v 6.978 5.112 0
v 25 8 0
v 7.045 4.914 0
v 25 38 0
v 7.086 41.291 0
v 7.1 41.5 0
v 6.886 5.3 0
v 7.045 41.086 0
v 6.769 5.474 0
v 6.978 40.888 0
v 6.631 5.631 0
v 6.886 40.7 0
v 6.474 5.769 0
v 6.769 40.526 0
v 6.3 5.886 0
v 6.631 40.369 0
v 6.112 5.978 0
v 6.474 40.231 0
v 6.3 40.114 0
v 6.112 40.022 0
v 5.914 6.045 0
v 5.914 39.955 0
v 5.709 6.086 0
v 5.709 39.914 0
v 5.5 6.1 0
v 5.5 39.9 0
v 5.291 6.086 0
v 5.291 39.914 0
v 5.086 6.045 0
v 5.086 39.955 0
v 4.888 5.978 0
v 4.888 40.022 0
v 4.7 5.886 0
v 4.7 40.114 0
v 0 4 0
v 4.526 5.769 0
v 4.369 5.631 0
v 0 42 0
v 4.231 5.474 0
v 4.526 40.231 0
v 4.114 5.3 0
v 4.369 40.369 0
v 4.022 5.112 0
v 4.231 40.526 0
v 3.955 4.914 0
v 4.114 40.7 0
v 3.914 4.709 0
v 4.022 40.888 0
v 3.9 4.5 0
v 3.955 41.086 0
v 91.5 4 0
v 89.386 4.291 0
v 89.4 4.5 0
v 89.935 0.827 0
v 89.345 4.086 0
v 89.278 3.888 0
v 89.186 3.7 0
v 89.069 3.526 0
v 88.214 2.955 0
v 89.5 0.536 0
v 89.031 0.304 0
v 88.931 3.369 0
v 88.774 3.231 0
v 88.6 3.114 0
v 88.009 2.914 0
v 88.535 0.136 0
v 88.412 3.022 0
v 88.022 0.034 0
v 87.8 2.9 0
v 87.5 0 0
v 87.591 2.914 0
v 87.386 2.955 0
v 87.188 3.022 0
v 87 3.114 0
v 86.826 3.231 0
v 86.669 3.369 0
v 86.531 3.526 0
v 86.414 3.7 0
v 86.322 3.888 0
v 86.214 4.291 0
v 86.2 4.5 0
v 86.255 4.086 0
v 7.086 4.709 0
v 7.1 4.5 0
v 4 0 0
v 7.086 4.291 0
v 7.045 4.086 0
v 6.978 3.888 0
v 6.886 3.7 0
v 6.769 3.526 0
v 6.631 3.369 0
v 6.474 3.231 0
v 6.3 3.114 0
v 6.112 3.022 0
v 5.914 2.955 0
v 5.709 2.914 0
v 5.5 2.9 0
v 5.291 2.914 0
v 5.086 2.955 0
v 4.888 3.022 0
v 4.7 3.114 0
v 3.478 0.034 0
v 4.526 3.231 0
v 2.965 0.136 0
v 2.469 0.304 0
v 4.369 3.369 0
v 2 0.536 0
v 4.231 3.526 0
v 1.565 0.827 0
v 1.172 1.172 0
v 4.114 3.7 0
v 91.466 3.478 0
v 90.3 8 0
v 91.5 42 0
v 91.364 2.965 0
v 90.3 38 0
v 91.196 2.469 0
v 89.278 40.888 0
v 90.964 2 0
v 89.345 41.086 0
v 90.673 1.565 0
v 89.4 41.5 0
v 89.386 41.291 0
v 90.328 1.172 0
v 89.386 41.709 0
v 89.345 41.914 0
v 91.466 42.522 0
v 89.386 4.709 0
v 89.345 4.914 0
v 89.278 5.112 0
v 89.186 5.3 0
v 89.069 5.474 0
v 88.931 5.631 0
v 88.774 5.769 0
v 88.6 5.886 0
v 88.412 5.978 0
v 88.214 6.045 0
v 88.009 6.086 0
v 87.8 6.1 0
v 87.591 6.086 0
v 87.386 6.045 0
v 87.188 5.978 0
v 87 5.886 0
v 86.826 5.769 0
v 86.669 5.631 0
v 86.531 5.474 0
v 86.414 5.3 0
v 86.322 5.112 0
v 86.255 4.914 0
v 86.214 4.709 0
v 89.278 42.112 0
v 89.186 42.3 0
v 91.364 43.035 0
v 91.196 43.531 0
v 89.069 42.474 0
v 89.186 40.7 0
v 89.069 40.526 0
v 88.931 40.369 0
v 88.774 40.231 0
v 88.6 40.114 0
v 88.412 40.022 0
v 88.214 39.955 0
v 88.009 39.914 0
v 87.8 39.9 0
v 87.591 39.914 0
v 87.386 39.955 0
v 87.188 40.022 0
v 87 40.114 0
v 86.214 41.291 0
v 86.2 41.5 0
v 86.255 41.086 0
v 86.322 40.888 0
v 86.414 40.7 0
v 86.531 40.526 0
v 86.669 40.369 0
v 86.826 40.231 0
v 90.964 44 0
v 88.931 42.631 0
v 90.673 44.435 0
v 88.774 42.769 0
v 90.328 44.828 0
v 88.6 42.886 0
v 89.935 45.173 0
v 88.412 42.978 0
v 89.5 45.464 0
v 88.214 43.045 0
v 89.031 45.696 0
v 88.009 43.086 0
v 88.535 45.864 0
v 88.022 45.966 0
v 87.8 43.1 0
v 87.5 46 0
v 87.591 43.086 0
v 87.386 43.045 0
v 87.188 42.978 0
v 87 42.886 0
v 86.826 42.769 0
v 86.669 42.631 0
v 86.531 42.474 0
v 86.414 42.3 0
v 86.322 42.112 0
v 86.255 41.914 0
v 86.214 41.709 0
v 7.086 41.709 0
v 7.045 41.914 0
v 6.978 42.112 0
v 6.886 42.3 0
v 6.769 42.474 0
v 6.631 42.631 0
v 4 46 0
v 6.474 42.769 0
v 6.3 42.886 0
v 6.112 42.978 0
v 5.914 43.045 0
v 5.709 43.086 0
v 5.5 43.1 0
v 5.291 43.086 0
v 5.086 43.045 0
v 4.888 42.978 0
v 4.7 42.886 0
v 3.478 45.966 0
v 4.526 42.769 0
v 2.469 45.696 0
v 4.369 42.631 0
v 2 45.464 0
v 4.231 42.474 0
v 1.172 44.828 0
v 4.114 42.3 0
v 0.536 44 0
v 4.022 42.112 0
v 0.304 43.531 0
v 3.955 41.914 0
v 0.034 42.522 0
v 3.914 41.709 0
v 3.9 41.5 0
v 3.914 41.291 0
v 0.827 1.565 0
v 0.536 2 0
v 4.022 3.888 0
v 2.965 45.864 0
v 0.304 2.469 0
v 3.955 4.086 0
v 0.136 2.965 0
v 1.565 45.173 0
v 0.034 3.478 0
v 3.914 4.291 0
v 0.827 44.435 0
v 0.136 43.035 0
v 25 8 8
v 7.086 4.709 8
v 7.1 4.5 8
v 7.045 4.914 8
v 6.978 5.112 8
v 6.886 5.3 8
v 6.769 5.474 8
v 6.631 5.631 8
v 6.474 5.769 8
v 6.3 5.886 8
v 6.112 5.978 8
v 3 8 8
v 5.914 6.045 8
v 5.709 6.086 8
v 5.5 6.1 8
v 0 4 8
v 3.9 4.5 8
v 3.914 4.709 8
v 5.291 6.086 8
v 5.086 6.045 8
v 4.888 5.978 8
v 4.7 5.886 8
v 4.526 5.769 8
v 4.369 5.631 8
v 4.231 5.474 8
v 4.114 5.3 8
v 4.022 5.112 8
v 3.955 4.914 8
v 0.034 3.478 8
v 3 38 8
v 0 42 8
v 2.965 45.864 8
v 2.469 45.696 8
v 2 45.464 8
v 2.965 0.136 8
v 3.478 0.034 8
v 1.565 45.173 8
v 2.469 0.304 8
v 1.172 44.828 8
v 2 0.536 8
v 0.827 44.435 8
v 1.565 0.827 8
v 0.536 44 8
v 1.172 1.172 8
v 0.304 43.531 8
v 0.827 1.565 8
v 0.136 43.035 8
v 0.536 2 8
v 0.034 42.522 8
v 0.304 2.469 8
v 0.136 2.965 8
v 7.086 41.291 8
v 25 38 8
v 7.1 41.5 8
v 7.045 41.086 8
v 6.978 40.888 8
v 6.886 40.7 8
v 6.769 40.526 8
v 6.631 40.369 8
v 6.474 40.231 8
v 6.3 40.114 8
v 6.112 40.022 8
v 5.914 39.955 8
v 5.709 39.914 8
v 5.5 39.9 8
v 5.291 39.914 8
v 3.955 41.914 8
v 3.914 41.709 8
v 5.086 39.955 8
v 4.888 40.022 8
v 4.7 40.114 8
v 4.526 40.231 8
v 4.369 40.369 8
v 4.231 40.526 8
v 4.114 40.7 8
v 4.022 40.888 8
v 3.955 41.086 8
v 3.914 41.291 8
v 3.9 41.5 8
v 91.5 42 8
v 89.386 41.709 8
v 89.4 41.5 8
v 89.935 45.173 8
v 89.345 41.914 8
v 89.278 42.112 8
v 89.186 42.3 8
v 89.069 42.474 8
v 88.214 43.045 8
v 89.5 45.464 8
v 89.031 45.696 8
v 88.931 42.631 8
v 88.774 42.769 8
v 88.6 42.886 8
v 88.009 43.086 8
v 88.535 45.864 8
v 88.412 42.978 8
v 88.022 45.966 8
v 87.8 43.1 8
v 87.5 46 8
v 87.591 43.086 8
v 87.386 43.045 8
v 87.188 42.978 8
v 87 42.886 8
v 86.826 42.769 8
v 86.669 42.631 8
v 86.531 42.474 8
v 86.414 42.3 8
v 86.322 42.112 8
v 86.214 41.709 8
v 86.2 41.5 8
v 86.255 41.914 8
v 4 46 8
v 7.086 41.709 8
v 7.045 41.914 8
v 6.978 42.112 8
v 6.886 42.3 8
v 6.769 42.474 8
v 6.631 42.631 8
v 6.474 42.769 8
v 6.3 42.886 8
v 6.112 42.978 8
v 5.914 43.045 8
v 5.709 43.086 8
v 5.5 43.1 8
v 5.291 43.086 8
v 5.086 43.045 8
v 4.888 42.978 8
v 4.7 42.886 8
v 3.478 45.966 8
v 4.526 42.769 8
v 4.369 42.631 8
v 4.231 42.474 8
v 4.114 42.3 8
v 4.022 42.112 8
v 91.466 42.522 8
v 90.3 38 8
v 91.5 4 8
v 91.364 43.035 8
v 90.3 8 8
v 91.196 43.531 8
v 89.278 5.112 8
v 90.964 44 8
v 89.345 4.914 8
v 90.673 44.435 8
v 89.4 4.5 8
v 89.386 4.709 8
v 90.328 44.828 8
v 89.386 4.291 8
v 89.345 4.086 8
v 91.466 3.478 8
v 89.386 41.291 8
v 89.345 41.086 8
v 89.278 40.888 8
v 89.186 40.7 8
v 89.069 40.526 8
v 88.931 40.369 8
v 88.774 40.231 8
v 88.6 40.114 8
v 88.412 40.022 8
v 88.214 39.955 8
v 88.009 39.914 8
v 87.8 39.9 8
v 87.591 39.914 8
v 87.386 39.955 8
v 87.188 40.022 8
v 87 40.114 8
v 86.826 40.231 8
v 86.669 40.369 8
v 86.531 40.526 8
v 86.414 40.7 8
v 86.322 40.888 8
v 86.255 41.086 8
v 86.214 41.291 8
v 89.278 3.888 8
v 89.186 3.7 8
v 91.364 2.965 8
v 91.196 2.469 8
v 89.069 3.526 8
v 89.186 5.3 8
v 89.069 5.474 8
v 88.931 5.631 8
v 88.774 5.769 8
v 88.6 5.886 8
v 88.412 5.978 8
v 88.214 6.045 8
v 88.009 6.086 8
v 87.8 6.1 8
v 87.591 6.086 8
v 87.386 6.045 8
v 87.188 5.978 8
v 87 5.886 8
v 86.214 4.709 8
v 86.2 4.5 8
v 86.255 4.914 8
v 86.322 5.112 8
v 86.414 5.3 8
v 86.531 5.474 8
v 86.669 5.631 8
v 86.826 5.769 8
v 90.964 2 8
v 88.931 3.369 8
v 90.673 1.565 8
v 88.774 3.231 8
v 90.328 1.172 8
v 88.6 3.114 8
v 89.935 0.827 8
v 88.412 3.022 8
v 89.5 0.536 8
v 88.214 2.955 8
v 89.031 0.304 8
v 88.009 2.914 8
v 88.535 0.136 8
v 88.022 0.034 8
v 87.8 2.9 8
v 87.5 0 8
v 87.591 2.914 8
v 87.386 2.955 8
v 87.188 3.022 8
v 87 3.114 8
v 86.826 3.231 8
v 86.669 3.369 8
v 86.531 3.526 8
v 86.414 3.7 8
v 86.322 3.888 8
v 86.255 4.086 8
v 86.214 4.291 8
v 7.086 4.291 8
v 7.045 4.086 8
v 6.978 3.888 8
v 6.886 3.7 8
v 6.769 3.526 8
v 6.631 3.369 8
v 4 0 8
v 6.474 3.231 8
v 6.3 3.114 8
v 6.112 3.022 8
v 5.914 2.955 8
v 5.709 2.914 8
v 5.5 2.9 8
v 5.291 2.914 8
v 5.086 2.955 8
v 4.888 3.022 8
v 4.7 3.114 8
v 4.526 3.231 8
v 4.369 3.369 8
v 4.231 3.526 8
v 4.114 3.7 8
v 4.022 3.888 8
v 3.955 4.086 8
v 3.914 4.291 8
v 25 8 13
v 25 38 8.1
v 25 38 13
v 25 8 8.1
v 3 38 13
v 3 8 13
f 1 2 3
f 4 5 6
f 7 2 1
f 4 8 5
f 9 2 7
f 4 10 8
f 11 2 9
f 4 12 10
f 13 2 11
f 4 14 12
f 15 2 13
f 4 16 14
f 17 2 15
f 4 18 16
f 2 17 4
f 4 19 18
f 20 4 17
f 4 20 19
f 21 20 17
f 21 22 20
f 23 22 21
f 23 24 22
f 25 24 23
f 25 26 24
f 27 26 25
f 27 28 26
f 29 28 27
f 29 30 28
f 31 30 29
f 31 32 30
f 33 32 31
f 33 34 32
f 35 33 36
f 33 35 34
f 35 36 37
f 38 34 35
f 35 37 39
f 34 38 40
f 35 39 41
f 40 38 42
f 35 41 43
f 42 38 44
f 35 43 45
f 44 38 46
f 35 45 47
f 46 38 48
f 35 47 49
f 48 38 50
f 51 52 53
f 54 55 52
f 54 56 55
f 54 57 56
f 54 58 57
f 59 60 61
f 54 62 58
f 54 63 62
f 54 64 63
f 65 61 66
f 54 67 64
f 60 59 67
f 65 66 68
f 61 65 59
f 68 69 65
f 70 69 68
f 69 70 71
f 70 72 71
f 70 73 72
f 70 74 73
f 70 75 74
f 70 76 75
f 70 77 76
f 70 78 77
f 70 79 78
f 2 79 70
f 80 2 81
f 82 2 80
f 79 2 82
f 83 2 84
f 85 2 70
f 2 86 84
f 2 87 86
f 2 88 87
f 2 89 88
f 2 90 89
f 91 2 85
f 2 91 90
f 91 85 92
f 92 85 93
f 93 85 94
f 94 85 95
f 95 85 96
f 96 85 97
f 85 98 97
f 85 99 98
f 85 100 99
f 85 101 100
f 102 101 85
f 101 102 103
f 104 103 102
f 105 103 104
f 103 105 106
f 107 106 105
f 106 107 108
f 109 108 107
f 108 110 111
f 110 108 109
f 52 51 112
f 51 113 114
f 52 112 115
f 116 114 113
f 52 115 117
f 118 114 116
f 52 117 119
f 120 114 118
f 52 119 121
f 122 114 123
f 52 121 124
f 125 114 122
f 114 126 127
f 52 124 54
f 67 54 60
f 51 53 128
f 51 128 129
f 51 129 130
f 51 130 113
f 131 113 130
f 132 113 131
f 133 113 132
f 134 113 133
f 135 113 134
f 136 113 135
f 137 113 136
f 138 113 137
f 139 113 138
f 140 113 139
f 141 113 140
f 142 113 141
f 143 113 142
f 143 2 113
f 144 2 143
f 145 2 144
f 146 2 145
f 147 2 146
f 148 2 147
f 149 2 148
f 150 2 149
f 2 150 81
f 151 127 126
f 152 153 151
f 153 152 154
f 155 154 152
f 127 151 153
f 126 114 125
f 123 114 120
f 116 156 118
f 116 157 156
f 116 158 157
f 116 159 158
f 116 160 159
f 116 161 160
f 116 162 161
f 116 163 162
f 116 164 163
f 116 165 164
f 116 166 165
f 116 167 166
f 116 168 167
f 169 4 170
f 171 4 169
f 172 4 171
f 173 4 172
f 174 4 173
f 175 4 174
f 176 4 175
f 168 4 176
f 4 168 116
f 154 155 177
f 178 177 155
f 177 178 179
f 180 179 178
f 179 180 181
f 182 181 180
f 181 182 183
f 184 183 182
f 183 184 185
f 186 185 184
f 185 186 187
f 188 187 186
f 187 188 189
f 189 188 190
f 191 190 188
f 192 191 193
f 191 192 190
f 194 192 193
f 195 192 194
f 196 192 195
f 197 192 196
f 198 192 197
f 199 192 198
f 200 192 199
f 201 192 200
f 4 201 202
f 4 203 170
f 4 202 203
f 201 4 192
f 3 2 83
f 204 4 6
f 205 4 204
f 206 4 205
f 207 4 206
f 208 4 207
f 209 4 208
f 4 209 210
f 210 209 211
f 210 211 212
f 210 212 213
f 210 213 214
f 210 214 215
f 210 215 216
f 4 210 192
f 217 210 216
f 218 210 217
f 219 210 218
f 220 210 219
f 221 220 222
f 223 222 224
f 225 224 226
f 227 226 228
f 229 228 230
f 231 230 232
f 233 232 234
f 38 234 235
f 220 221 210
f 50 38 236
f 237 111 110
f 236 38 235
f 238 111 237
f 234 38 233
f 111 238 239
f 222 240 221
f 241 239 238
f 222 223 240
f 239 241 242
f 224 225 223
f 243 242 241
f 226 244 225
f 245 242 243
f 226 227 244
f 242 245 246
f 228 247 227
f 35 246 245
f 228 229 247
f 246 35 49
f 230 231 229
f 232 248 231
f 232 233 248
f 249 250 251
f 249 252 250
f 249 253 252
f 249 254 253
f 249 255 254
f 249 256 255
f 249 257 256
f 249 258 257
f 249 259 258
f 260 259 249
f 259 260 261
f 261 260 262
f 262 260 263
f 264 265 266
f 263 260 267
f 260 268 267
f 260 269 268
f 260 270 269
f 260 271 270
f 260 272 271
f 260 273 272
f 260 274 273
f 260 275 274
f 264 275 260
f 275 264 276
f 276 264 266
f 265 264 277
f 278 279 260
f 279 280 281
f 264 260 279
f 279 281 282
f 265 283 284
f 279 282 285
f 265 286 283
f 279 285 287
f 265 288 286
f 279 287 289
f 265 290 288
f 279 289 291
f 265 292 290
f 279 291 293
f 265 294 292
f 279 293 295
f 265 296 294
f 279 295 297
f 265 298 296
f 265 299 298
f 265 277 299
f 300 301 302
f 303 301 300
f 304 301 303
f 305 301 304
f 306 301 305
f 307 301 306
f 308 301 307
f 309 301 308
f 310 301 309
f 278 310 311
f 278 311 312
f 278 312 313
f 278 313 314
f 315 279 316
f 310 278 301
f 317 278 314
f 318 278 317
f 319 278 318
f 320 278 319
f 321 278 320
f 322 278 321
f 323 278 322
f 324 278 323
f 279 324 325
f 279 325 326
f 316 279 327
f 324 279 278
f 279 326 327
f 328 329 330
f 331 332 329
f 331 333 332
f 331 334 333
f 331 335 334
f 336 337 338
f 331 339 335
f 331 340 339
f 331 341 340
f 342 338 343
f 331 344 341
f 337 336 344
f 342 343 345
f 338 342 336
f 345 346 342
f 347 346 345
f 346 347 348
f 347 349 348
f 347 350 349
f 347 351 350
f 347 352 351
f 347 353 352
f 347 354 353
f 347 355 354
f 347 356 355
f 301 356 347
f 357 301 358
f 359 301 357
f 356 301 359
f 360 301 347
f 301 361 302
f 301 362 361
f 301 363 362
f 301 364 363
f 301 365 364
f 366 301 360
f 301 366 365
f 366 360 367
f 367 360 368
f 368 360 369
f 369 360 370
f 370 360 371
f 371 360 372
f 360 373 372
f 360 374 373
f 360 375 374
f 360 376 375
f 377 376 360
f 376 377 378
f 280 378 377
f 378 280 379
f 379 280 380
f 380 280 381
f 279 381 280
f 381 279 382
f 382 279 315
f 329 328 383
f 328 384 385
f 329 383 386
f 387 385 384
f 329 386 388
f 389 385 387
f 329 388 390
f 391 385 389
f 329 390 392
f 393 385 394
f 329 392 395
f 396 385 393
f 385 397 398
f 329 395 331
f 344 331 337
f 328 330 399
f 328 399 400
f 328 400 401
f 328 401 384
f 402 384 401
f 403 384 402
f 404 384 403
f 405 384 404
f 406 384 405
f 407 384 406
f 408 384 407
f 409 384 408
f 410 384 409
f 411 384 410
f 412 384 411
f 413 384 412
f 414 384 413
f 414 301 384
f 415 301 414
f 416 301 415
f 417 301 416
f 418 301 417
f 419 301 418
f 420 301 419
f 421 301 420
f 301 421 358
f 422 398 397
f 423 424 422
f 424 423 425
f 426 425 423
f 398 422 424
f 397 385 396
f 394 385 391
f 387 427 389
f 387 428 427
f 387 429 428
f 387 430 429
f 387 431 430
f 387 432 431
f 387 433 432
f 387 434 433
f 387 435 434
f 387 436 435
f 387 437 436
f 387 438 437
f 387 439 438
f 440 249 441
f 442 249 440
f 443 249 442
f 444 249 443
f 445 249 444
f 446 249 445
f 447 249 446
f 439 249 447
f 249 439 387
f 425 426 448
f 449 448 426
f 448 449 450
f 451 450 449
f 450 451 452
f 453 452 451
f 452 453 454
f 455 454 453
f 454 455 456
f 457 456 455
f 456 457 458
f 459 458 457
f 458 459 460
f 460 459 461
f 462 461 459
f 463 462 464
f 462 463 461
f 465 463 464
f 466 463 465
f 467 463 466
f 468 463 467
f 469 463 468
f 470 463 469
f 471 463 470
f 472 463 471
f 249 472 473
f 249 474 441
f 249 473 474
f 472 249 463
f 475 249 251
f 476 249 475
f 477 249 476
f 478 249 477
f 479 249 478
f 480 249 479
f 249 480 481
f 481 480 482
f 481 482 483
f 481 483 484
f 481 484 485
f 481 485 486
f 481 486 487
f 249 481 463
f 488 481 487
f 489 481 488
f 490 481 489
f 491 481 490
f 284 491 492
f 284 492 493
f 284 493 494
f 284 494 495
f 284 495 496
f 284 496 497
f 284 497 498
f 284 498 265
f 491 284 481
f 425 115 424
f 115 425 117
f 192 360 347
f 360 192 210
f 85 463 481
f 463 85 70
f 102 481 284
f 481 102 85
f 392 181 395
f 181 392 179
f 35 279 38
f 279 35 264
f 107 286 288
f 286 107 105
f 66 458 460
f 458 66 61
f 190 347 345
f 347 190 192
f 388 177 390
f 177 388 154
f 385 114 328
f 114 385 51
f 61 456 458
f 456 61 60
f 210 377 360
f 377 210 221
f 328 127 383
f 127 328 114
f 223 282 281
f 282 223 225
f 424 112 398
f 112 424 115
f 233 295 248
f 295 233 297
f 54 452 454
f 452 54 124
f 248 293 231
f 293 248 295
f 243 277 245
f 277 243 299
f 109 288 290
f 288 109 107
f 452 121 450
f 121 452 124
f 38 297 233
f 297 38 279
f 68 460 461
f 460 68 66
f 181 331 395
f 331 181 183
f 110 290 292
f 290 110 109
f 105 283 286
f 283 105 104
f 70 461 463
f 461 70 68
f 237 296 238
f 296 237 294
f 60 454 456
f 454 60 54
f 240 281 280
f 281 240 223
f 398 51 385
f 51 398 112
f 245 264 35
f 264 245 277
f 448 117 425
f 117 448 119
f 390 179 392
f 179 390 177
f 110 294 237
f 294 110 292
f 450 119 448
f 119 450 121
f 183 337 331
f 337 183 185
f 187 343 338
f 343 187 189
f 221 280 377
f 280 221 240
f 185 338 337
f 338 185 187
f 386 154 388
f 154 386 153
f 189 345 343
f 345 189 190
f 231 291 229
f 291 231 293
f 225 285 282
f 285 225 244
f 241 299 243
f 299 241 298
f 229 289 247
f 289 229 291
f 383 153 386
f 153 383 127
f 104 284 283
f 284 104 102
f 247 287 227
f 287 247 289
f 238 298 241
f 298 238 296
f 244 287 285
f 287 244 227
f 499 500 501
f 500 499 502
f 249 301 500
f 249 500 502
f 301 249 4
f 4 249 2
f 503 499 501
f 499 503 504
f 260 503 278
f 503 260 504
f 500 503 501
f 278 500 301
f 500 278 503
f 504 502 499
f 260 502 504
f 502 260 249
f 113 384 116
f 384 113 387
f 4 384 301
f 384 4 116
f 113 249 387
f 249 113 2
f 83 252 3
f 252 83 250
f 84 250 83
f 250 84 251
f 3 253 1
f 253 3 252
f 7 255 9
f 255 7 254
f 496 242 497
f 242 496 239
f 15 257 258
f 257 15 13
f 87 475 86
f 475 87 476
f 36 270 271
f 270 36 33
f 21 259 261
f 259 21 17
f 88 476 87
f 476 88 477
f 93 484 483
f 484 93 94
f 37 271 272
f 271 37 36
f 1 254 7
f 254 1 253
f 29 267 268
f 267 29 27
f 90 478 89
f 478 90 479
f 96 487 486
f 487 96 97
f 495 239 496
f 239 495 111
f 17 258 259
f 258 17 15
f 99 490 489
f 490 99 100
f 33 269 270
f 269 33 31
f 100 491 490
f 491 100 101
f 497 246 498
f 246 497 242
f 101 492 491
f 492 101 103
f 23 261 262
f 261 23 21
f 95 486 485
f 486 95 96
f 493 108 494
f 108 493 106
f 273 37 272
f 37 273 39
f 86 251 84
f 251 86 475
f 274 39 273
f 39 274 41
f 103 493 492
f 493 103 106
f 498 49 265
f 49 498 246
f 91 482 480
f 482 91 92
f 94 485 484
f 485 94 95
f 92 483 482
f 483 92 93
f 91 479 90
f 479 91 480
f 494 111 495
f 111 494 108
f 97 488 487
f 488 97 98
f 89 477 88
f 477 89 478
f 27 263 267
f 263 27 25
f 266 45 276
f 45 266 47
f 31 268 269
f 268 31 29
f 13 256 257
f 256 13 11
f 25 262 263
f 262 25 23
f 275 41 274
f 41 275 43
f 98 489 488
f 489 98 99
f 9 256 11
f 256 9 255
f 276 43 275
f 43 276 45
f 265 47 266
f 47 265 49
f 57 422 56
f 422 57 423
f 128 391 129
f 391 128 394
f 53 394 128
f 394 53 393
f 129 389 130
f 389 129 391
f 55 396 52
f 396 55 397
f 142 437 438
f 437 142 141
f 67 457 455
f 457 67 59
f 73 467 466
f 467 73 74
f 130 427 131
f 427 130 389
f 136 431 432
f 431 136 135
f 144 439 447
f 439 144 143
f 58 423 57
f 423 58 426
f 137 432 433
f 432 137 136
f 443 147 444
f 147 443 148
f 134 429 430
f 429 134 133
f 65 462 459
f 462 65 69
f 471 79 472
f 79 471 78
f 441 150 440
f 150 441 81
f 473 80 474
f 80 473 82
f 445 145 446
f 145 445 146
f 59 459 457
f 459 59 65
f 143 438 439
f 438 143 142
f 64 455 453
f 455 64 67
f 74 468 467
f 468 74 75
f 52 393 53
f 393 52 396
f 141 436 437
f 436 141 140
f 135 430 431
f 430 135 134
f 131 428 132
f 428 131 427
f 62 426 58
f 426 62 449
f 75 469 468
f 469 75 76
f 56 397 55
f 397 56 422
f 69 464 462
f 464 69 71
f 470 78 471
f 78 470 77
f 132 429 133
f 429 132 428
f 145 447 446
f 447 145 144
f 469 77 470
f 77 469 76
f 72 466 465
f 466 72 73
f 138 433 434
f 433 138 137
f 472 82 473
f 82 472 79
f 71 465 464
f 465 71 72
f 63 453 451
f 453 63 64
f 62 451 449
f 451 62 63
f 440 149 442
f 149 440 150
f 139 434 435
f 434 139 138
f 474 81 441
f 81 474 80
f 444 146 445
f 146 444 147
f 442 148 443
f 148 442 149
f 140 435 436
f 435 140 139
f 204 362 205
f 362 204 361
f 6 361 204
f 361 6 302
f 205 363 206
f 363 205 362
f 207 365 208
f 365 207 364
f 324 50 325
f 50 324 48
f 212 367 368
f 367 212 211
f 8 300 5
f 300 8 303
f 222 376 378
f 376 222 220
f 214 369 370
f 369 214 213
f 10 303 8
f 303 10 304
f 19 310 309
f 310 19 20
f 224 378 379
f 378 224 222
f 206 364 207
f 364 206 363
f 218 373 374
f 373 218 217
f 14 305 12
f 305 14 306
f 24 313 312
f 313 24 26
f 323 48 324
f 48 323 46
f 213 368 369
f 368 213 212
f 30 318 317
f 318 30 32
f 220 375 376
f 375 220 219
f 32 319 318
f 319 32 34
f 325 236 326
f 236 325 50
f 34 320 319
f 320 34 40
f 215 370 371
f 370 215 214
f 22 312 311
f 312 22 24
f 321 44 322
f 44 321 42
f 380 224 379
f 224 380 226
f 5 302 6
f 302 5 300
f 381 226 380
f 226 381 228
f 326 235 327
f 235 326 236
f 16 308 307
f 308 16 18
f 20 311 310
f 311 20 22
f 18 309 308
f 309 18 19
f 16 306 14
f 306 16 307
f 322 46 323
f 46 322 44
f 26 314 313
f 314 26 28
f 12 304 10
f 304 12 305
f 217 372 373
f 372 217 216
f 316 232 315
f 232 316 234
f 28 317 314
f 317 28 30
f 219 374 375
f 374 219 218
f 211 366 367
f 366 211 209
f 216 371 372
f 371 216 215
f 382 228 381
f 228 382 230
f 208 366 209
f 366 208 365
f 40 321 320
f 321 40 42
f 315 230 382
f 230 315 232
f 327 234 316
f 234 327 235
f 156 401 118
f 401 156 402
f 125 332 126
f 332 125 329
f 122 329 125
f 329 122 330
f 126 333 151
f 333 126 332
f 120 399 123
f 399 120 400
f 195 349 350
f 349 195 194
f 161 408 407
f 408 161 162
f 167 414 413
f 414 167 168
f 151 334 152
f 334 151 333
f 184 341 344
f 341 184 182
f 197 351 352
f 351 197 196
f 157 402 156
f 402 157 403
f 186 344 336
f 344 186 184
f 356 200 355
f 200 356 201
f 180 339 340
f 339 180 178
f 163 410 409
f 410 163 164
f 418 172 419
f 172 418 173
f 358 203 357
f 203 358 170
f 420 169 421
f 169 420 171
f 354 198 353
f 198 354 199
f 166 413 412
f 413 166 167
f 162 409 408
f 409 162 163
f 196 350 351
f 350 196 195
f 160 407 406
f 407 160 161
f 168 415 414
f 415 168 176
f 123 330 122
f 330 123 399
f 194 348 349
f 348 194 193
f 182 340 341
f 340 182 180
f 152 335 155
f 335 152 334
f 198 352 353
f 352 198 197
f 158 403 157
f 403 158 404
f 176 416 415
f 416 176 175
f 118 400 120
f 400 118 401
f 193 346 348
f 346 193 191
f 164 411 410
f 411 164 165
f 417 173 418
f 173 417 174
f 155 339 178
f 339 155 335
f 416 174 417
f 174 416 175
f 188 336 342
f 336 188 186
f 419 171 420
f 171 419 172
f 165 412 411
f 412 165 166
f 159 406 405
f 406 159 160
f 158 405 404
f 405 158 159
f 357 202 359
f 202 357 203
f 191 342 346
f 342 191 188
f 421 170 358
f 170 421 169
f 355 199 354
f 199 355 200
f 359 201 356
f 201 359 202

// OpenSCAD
// Dilder Rev 2 "extended with joystick" — MIDDLE PLATFORM v2 (Y=46 variant)
//
// Forked from middle-platform-v1.scad to match base-v2-thin-dual-10440's
// +2 mm outer-Y bump (44 → 46 mm). Only difference from v1 is the outer
// Y dimension; everything else (fill block X extent, pillar XY pattern,
// wall thicknesses, pillar screw centers) is unchanged so the full stack
// bolts up with the same M3 hardware in the same positions.
//
// Export:
//   openscad -o middle-platform-v2-46y.3mf middle-platform-v2-46y.scad

$fn = 48;

// ============================================================
// Outer shell dimensions (flush with base-v2)
// ============================================================
enclosure_outer_width_along_x_axis_mm           = 91.5;
enclosure_outer_depth_along_y_axis_mm           = 46;   // was 44 in v1; matches base-v2
middle_platform_short_portion_height_z_mm       = 8;
outer_case_top_view_corner_radius_mm            = 4;

// ============================================================
// Left-side internal fill pedestal (unchanged from v1)
// ============================================================
left_fill_interior_depth_along_x_mm             = 22;
left_fill_height_above_shell_top_mm             = 5;

// ============================================================
// Wall thicknesses (unchanged from v1)
// ============================================================
perimeter_long_side_wall_thickness_y_mm         = 8;
minus_x_end_wall_thickness_mm                   = 3.0;
plus_x_end_wall_thickness_mm                    = 1.2;

left_fill_end_x_mm =
    minus_x_end_wall_thickness_mm + left_fill_interior_depth_along_x_mm;  // = 25
left_fill_top_z_mm =
    middle_platform_short_portion_height_z_mm
      + left_fill_height_above_shell_top_mm;  // = 13

// ============================================================
// Corner pillars (XY origins auto-track the wider Y so screws
// stay aligned with base-v2's pillars)
// ============================================================
corner_pillar_square_side_length_mm             = 5;
corner_pillar_inner_facing_corner_radius_mm     = 1;
m3_screw_clearance_hole_diameter_mm             = 3.2;
perimeter_outer_wall_thickness_mm_base          = 2;

corner_pillar_xy_origin_positions_list = [
    [minus_x_end_wall_thickness_mm,
     perimeter_outer_wall_thickness_mm_base],
    [enclosure_outer_width_along_x_axis_mm
       - plus_x_end_wall_thickness_mm
       - corner_pillar_square_side_length_mm,
     perimeter_outer_wall_thickness_mm_base],
    [minus_x_end_wall_thickness_mm,
     enclosure_outer_depth_along_y_axis_mm
       - perimeter_outer_wall_thickness_mm_base
       - corner_pillar_square_side_length_mm],
    [enclosure_outer_width_along_x_axis_mm
       - plus_x_end_wall_thickness_mm
       - corner_pillar_square_side_length_mm,
     enclosure_outer_depth_along_y_axis_mm
       - perimeter_outer_wall_thickness_mm_base
       - corner_pillar_square_side_length_mm],
];

// ========== Helpers (shared shape language) ==========

module rounded_v_box(w, l, h, r, fn = 48) {
    hull() {
        for (x = [r, w - r])
            for (y = [r, l - r])
                translate([x, y, 0])
                    cylinder(r = r, h = h, $fn = fn);
    }
}

module pillar_one_round(w, l, h, r, round_x, round_y) {
    tiny = 0.01;
    hull() {
        for (ix = [0, 1])
            for (iy = [0, 1]) {
                cr = (ix == round_x && iy == round_y) ? r : tiny;
                translate([cr + ix * (w - 2*cr), cr + iy * (l - 2*cr), 0])
                    cylinder(r = cr, h = h, $fn = 48);
            }
    }
}

module chamber_carve_preserving_pillars(origin_x, origin_y, origin_z,
                                        width_x, depth_y, height_z,
                                        pillar_xy_list, pillar_side) {
    difference() {
        translate([origin_x, origin_y, origin_z])
            cube([width_x, depth_y, height_z]);
        for (pillar_origin_xy = pillar_xy_list)
            translate([pillar_origin_xy[0], pillar_origin_xy[1], origin_z - 0.5])
                cube([pillar_side, pillar_side, height_z + 1]);
    }
}

// ========== Middle platform ==========

module middle_platform() {
    right_interior_x_start_mm = left_fill_end_x_mm;
    right_interior_x_end_mm =
        enclosure_outer_width_along_x_axis_mm - plus_x_end_wall_thickness_mm;
    interior_y_start_mm = perimeter_long_side_wall_thickness_y_mm;
    interior_y_depth_mm =
        enclosure_outer_depth_along_y_axis_mm
          - 2 * perimeter_long_side_wall_thickness_y_mm;

    difference() {
        union() {
            rounded_v_box(
                enclosure_outer_width_along_x_axis_mm,
                enclosure_outer_depth_along_y_axis_mm,
                middle_platform_short_portion_height_z_mm,
                outer_case_top_view_corner_radius_mm);

            translate([minus_x_end_wall_thickness_mm,
                       interior_y_start_mm,
                       0])
                cube([left_fill_interior_depth_along_x_mm,
                      interior_y_depth_mm,
                      left_fill_top_z_mm]);

            for (corner_pillar_origin_xy = corner_pillar_xy_origin_positions_list) {
                pillar_rounds_positive_x_corner =
                    (corner_pillar_origin_xy[0]
                      < enclosure_outer_width_along_x_axis_mm / 2) ? 1 : 0;
                pillar_rounds_positive_y_corner =
                    (corner_pillar_origin_xy[1]
                      < enclosure_outer_depth_along_y_axis_mm / 2) ? 1 : 0;
                translate([corner_pillar_origin_xy[0],
                           corner_pillar_origin_xy[1],
                           0])
                    pillar_one_round(
                        corner_pillar_square_side_length_mm,
                        corner_pillar_square_side_length_mm,
                        middle_platform_short_portion_height_z_mm,
                        corner_pillar_inner_facing_corner_radius_mm,
                        pillar_rounds_positive_x_corner,
                        pillar_rounds_positive_y_corner);
            }
        }

        chamber_carve_preserving_pillars(
            right_interior_x_start_mm,
            interior_y_start_mm,
            -0.1,
            right_interior_x_end_mm - right_interior_x_start_mm,
            interior_y_depth_mm,
            middle_platform_short_portion_height_z_mm + 0.2,
            corner_pillar_xy_origin_positions_list,
            corner_pillar_square_side_length_mm);

        for (corner_pillar_origin_xy = corner_pillar_xy_origin_positions_list) {
            screw_hole_center_x_mm =
                corner_pillar_origin_xy[0]
                  + corner_pillar_square_side_length_mm / 2;
            screw_hole_center_y_mm =
                corner_pillar_origin_xy[1]
                  + corner_pillar_square_side_length_mm / 2;
            translate([screw_hole_center_x_mm,
                       screw_hole_center_y_mm,
                       -0.1])
                cylinder(
                    h = middle_platform_short_portion_height_z_mm + 0.2,
                    d = m3_screw_clearance_hole_diameter_mm);
        }
    }
}

middle_platform();
